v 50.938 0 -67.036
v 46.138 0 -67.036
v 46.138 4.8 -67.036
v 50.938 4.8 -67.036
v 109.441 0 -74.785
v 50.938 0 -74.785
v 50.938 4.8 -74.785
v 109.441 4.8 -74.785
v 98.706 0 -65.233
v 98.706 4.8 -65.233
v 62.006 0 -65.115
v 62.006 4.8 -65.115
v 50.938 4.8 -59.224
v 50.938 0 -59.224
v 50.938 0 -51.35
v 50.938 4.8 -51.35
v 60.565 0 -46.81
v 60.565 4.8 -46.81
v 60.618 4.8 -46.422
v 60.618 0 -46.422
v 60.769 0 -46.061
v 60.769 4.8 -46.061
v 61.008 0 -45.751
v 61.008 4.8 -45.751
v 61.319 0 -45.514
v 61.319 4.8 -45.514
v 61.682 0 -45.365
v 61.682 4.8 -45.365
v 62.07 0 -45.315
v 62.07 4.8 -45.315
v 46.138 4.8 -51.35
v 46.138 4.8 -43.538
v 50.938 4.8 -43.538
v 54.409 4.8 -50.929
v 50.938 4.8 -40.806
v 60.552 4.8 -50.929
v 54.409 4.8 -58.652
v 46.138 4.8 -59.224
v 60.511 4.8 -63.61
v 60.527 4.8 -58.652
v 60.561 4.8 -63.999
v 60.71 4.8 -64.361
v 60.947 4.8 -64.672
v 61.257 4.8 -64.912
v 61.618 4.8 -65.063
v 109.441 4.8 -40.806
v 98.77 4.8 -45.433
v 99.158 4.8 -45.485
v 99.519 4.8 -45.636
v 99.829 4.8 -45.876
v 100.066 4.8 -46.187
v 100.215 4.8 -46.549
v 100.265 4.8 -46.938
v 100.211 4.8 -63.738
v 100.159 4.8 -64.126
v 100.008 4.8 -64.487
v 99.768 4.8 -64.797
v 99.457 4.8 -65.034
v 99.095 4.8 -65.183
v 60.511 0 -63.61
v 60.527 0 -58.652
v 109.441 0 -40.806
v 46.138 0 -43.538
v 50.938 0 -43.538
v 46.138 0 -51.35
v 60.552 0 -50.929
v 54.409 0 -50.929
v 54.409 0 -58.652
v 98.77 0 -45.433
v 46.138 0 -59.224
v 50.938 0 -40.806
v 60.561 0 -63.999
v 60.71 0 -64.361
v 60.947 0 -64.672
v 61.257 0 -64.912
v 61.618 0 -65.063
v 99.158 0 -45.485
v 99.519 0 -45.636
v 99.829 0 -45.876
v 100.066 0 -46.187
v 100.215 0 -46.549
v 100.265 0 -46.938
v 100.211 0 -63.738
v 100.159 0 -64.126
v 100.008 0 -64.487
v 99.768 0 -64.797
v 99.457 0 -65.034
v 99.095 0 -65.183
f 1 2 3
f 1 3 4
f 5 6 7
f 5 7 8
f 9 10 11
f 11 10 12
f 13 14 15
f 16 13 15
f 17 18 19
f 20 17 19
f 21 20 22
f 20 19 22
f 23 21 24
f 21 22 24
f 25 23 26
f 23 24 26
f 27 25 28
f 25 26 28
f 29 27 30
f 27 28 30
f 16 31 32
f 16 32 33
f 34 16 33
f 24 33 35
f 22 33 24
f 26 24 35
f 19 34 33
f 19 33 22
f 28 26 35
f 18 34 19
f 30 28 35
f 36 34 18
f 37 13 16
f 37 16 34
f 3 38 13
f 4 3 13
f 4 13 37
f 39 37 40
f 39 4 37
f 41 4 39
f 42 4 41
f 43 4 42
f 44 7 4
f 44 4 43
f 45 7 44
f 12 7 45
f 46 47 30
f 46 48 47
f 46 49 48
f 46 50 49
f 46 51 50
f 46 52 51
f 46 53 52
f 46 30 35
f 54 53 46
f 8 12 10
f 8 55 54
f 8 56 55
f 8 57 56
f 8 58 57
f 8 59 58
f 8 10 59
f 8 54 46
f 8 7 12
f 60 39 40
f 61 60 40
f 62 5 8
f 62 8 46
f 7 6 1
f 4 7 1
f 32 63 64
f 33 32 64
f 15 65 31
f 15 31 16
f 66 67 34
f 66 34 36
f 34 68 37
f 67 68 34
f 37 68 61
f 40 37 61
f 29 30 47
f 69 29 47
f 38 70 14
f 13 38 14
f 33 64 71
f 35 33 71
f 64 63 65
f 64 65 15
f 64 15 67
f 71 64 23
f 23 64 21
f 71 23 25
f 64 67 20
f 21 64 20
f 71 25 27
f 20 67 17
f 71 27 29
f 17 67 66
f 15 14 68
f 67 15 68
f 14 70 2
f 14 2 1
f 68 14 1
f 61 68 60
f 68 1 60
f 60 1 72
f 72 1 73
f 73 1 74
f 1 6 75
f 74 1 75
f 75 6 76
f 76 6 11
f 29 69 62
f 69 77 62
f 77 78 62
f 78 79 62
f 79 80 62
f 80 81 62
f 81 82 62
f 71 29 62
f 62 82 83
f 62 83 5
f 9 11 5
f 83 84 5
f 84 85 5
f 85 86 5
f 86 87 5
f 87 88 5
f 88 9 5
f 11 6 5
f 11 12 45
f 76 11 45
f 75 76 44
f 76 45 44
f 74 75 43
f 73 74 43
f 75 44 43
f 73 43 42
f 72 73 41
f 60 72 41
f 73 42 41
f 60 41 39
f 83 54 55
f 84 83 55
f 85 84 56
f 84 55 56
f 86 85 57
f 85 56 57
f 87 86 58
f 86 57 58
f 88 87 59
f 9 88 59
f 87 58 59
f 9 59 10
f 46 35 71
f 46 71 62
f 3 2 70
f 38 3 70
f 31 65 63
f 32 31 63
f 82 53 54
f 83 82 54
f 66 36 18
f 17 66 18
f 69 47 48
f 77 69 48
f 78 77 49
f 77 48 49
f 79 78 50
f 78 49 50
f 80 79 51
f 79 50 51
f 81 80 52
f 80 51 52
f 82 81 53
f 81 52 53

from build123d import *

# Parameters (mm, degrees)
SKETCH1_W           = 127
SKETCH1_H           = 101.6
BOSS_EXTRUDE1_DEPTH = 4.800000052
CUT_EXTRUDE1_DEPTH  = 163.710171779
SKETCH4_W           = 127
SKETCH4_H           = 101.6
SKETCH4_W_2         = 63.302571571
SKETCH4_H_2         = 39.058596
CUT_EXTRUDE3_DEPTH  = 163.710171779
SKETCH5_W           = 4.800000052
SKETCH5_H           = 7.8117192
SKETCH5_H_2         = 7.874
SKETCH5_H_3         = 7.7494384
CUT_EXTRUDE4_DEPTH  = 133.639014141
SKETCH6_W           = 6.142649692
SKETCH6_H           = 7.722699729
CUT_EXTRUDE5_DEPTH  = 133.639014141
SKETCH7_W           = 58.502571519
SKETCH7_H           = 5.08
CUT_EXTRUDE6_DEPTH  = 133.639014141


with BuildPart() as part:
    # Sketch1 → Boss-Extrude1 (new body)
    with BuildSketch(Plane(origin=(0, 0, 0), x_dir=(1, 0, 0), z_dir=(0, 1, 0))):
        with Locations((63.5, 50.8)):
            Rectangle(SKETCH1_W, SKETCH1_H)
    extrude(amount=BOSS_EXTRUDE1_DEPTH)

    # Sketch3 → Cut-Extrude1 (cut, through all)
    with BuildSketch(Plane(origin=(0, 4.800000052, 0), x_dir=(1, 0, 0), z_dir=(0, 1, 0))):
        with BuildLine():
            Line((62.069935242, 45.315244869), (98.769812683, 45.432826029))
            ThreePointArc((98.769812683, 45.432826029), (99.829038472, 45.875546579), (100.264962787, 46.93758742))
            Line((100.264962787, 46.93758742), (100.211138047, 63.737569431))
            ThreePointArc((100.211138047, 63.737569431), (99.768417497, 64.79679522), (98.706376655, 65.232719535))
            Line((98.706376655, 65.232719535), (62.006499215, 65.115138375))
            ThreePointArc((62.006499215, 65.115138375), (60.947273426, 64.672417825), (60.51134911, 63.610376984))
            Line((60.51134911, 63.610376984), (60.565173851, 46.810394973))
            ThreePointArc((60.565173851, 46.810394973), (61.007894401, 45.751169184), (62.069935242, 45.315244869))
        make_face()
    extrude(amount=-CUT_EXTRUDE1_DEPTH, mode=Mode.SUBTRACT)

    # Sketch4 → Cut-Extrude3 (cut, through all)
    with BuildSketch(Plane.XZ):
        with Locations((63.5, -50.8)):
            Rectangle(SKETCH4_W, SKETCH4_H)
        with Locations((77.789401758, -55.255753861)):
            Rectangle(SKETCH4_W_2, SKETCH4_H_2, mode=Mode.SUBTRACT)
    extrude(amount=-CUT_EXTRUDE3_DEPTH, mode=Mode.SUBTRACT)

    # Sketch5 → Cut-Extrude4 (cut, through all)
    with BuildSketch(Plane.XZ):
        with Locations((48.538115998, -39.632315461)):
            Rectangle(SKETCH5_W, SKETCH5_H)
        with Locations((48.538115998, -55.286894261)):
            Rectangle(SKETCH5_W, SKETCH5_H_2)
        with Locations((48.538115998, -70.910332661)):
            Rectangle(SKETCH5_W, SKETCH5_H_3)
    extrude(amount=-CUT_EXTRUDE4_DEPTH, mode=Mode.SUBTRACT)

    # Sketch6 → Cut-Extrude5 (cut, through all)
    with BuildSketch(Plane.XZ):
        with Locations((57.480654221, -54.790150784)):
            Rectangle(SKETCH6_W, SKETCH6_H)
    extrude(amount=-CUT_EXTRUDE5_DEPTH, mode=Mode.SUBTRACT)

    # Sketch7 → Cut-Extrude6 (cut, through all)
    with BuildSketch(Plane(origin=(0, 4.800000052, 0), x_dir=(1, 0, 0), z_dir=(0, 1, 0))):
        with Locations((80.189401784, 38.266455861)):
            Rectangle(SKETCH7_W, SKETCH7_H)
    extrude(amount=-CUT_EXTRUDE6_DEPTH, mode=Mode.SUBTRACT)


solid = part.part
